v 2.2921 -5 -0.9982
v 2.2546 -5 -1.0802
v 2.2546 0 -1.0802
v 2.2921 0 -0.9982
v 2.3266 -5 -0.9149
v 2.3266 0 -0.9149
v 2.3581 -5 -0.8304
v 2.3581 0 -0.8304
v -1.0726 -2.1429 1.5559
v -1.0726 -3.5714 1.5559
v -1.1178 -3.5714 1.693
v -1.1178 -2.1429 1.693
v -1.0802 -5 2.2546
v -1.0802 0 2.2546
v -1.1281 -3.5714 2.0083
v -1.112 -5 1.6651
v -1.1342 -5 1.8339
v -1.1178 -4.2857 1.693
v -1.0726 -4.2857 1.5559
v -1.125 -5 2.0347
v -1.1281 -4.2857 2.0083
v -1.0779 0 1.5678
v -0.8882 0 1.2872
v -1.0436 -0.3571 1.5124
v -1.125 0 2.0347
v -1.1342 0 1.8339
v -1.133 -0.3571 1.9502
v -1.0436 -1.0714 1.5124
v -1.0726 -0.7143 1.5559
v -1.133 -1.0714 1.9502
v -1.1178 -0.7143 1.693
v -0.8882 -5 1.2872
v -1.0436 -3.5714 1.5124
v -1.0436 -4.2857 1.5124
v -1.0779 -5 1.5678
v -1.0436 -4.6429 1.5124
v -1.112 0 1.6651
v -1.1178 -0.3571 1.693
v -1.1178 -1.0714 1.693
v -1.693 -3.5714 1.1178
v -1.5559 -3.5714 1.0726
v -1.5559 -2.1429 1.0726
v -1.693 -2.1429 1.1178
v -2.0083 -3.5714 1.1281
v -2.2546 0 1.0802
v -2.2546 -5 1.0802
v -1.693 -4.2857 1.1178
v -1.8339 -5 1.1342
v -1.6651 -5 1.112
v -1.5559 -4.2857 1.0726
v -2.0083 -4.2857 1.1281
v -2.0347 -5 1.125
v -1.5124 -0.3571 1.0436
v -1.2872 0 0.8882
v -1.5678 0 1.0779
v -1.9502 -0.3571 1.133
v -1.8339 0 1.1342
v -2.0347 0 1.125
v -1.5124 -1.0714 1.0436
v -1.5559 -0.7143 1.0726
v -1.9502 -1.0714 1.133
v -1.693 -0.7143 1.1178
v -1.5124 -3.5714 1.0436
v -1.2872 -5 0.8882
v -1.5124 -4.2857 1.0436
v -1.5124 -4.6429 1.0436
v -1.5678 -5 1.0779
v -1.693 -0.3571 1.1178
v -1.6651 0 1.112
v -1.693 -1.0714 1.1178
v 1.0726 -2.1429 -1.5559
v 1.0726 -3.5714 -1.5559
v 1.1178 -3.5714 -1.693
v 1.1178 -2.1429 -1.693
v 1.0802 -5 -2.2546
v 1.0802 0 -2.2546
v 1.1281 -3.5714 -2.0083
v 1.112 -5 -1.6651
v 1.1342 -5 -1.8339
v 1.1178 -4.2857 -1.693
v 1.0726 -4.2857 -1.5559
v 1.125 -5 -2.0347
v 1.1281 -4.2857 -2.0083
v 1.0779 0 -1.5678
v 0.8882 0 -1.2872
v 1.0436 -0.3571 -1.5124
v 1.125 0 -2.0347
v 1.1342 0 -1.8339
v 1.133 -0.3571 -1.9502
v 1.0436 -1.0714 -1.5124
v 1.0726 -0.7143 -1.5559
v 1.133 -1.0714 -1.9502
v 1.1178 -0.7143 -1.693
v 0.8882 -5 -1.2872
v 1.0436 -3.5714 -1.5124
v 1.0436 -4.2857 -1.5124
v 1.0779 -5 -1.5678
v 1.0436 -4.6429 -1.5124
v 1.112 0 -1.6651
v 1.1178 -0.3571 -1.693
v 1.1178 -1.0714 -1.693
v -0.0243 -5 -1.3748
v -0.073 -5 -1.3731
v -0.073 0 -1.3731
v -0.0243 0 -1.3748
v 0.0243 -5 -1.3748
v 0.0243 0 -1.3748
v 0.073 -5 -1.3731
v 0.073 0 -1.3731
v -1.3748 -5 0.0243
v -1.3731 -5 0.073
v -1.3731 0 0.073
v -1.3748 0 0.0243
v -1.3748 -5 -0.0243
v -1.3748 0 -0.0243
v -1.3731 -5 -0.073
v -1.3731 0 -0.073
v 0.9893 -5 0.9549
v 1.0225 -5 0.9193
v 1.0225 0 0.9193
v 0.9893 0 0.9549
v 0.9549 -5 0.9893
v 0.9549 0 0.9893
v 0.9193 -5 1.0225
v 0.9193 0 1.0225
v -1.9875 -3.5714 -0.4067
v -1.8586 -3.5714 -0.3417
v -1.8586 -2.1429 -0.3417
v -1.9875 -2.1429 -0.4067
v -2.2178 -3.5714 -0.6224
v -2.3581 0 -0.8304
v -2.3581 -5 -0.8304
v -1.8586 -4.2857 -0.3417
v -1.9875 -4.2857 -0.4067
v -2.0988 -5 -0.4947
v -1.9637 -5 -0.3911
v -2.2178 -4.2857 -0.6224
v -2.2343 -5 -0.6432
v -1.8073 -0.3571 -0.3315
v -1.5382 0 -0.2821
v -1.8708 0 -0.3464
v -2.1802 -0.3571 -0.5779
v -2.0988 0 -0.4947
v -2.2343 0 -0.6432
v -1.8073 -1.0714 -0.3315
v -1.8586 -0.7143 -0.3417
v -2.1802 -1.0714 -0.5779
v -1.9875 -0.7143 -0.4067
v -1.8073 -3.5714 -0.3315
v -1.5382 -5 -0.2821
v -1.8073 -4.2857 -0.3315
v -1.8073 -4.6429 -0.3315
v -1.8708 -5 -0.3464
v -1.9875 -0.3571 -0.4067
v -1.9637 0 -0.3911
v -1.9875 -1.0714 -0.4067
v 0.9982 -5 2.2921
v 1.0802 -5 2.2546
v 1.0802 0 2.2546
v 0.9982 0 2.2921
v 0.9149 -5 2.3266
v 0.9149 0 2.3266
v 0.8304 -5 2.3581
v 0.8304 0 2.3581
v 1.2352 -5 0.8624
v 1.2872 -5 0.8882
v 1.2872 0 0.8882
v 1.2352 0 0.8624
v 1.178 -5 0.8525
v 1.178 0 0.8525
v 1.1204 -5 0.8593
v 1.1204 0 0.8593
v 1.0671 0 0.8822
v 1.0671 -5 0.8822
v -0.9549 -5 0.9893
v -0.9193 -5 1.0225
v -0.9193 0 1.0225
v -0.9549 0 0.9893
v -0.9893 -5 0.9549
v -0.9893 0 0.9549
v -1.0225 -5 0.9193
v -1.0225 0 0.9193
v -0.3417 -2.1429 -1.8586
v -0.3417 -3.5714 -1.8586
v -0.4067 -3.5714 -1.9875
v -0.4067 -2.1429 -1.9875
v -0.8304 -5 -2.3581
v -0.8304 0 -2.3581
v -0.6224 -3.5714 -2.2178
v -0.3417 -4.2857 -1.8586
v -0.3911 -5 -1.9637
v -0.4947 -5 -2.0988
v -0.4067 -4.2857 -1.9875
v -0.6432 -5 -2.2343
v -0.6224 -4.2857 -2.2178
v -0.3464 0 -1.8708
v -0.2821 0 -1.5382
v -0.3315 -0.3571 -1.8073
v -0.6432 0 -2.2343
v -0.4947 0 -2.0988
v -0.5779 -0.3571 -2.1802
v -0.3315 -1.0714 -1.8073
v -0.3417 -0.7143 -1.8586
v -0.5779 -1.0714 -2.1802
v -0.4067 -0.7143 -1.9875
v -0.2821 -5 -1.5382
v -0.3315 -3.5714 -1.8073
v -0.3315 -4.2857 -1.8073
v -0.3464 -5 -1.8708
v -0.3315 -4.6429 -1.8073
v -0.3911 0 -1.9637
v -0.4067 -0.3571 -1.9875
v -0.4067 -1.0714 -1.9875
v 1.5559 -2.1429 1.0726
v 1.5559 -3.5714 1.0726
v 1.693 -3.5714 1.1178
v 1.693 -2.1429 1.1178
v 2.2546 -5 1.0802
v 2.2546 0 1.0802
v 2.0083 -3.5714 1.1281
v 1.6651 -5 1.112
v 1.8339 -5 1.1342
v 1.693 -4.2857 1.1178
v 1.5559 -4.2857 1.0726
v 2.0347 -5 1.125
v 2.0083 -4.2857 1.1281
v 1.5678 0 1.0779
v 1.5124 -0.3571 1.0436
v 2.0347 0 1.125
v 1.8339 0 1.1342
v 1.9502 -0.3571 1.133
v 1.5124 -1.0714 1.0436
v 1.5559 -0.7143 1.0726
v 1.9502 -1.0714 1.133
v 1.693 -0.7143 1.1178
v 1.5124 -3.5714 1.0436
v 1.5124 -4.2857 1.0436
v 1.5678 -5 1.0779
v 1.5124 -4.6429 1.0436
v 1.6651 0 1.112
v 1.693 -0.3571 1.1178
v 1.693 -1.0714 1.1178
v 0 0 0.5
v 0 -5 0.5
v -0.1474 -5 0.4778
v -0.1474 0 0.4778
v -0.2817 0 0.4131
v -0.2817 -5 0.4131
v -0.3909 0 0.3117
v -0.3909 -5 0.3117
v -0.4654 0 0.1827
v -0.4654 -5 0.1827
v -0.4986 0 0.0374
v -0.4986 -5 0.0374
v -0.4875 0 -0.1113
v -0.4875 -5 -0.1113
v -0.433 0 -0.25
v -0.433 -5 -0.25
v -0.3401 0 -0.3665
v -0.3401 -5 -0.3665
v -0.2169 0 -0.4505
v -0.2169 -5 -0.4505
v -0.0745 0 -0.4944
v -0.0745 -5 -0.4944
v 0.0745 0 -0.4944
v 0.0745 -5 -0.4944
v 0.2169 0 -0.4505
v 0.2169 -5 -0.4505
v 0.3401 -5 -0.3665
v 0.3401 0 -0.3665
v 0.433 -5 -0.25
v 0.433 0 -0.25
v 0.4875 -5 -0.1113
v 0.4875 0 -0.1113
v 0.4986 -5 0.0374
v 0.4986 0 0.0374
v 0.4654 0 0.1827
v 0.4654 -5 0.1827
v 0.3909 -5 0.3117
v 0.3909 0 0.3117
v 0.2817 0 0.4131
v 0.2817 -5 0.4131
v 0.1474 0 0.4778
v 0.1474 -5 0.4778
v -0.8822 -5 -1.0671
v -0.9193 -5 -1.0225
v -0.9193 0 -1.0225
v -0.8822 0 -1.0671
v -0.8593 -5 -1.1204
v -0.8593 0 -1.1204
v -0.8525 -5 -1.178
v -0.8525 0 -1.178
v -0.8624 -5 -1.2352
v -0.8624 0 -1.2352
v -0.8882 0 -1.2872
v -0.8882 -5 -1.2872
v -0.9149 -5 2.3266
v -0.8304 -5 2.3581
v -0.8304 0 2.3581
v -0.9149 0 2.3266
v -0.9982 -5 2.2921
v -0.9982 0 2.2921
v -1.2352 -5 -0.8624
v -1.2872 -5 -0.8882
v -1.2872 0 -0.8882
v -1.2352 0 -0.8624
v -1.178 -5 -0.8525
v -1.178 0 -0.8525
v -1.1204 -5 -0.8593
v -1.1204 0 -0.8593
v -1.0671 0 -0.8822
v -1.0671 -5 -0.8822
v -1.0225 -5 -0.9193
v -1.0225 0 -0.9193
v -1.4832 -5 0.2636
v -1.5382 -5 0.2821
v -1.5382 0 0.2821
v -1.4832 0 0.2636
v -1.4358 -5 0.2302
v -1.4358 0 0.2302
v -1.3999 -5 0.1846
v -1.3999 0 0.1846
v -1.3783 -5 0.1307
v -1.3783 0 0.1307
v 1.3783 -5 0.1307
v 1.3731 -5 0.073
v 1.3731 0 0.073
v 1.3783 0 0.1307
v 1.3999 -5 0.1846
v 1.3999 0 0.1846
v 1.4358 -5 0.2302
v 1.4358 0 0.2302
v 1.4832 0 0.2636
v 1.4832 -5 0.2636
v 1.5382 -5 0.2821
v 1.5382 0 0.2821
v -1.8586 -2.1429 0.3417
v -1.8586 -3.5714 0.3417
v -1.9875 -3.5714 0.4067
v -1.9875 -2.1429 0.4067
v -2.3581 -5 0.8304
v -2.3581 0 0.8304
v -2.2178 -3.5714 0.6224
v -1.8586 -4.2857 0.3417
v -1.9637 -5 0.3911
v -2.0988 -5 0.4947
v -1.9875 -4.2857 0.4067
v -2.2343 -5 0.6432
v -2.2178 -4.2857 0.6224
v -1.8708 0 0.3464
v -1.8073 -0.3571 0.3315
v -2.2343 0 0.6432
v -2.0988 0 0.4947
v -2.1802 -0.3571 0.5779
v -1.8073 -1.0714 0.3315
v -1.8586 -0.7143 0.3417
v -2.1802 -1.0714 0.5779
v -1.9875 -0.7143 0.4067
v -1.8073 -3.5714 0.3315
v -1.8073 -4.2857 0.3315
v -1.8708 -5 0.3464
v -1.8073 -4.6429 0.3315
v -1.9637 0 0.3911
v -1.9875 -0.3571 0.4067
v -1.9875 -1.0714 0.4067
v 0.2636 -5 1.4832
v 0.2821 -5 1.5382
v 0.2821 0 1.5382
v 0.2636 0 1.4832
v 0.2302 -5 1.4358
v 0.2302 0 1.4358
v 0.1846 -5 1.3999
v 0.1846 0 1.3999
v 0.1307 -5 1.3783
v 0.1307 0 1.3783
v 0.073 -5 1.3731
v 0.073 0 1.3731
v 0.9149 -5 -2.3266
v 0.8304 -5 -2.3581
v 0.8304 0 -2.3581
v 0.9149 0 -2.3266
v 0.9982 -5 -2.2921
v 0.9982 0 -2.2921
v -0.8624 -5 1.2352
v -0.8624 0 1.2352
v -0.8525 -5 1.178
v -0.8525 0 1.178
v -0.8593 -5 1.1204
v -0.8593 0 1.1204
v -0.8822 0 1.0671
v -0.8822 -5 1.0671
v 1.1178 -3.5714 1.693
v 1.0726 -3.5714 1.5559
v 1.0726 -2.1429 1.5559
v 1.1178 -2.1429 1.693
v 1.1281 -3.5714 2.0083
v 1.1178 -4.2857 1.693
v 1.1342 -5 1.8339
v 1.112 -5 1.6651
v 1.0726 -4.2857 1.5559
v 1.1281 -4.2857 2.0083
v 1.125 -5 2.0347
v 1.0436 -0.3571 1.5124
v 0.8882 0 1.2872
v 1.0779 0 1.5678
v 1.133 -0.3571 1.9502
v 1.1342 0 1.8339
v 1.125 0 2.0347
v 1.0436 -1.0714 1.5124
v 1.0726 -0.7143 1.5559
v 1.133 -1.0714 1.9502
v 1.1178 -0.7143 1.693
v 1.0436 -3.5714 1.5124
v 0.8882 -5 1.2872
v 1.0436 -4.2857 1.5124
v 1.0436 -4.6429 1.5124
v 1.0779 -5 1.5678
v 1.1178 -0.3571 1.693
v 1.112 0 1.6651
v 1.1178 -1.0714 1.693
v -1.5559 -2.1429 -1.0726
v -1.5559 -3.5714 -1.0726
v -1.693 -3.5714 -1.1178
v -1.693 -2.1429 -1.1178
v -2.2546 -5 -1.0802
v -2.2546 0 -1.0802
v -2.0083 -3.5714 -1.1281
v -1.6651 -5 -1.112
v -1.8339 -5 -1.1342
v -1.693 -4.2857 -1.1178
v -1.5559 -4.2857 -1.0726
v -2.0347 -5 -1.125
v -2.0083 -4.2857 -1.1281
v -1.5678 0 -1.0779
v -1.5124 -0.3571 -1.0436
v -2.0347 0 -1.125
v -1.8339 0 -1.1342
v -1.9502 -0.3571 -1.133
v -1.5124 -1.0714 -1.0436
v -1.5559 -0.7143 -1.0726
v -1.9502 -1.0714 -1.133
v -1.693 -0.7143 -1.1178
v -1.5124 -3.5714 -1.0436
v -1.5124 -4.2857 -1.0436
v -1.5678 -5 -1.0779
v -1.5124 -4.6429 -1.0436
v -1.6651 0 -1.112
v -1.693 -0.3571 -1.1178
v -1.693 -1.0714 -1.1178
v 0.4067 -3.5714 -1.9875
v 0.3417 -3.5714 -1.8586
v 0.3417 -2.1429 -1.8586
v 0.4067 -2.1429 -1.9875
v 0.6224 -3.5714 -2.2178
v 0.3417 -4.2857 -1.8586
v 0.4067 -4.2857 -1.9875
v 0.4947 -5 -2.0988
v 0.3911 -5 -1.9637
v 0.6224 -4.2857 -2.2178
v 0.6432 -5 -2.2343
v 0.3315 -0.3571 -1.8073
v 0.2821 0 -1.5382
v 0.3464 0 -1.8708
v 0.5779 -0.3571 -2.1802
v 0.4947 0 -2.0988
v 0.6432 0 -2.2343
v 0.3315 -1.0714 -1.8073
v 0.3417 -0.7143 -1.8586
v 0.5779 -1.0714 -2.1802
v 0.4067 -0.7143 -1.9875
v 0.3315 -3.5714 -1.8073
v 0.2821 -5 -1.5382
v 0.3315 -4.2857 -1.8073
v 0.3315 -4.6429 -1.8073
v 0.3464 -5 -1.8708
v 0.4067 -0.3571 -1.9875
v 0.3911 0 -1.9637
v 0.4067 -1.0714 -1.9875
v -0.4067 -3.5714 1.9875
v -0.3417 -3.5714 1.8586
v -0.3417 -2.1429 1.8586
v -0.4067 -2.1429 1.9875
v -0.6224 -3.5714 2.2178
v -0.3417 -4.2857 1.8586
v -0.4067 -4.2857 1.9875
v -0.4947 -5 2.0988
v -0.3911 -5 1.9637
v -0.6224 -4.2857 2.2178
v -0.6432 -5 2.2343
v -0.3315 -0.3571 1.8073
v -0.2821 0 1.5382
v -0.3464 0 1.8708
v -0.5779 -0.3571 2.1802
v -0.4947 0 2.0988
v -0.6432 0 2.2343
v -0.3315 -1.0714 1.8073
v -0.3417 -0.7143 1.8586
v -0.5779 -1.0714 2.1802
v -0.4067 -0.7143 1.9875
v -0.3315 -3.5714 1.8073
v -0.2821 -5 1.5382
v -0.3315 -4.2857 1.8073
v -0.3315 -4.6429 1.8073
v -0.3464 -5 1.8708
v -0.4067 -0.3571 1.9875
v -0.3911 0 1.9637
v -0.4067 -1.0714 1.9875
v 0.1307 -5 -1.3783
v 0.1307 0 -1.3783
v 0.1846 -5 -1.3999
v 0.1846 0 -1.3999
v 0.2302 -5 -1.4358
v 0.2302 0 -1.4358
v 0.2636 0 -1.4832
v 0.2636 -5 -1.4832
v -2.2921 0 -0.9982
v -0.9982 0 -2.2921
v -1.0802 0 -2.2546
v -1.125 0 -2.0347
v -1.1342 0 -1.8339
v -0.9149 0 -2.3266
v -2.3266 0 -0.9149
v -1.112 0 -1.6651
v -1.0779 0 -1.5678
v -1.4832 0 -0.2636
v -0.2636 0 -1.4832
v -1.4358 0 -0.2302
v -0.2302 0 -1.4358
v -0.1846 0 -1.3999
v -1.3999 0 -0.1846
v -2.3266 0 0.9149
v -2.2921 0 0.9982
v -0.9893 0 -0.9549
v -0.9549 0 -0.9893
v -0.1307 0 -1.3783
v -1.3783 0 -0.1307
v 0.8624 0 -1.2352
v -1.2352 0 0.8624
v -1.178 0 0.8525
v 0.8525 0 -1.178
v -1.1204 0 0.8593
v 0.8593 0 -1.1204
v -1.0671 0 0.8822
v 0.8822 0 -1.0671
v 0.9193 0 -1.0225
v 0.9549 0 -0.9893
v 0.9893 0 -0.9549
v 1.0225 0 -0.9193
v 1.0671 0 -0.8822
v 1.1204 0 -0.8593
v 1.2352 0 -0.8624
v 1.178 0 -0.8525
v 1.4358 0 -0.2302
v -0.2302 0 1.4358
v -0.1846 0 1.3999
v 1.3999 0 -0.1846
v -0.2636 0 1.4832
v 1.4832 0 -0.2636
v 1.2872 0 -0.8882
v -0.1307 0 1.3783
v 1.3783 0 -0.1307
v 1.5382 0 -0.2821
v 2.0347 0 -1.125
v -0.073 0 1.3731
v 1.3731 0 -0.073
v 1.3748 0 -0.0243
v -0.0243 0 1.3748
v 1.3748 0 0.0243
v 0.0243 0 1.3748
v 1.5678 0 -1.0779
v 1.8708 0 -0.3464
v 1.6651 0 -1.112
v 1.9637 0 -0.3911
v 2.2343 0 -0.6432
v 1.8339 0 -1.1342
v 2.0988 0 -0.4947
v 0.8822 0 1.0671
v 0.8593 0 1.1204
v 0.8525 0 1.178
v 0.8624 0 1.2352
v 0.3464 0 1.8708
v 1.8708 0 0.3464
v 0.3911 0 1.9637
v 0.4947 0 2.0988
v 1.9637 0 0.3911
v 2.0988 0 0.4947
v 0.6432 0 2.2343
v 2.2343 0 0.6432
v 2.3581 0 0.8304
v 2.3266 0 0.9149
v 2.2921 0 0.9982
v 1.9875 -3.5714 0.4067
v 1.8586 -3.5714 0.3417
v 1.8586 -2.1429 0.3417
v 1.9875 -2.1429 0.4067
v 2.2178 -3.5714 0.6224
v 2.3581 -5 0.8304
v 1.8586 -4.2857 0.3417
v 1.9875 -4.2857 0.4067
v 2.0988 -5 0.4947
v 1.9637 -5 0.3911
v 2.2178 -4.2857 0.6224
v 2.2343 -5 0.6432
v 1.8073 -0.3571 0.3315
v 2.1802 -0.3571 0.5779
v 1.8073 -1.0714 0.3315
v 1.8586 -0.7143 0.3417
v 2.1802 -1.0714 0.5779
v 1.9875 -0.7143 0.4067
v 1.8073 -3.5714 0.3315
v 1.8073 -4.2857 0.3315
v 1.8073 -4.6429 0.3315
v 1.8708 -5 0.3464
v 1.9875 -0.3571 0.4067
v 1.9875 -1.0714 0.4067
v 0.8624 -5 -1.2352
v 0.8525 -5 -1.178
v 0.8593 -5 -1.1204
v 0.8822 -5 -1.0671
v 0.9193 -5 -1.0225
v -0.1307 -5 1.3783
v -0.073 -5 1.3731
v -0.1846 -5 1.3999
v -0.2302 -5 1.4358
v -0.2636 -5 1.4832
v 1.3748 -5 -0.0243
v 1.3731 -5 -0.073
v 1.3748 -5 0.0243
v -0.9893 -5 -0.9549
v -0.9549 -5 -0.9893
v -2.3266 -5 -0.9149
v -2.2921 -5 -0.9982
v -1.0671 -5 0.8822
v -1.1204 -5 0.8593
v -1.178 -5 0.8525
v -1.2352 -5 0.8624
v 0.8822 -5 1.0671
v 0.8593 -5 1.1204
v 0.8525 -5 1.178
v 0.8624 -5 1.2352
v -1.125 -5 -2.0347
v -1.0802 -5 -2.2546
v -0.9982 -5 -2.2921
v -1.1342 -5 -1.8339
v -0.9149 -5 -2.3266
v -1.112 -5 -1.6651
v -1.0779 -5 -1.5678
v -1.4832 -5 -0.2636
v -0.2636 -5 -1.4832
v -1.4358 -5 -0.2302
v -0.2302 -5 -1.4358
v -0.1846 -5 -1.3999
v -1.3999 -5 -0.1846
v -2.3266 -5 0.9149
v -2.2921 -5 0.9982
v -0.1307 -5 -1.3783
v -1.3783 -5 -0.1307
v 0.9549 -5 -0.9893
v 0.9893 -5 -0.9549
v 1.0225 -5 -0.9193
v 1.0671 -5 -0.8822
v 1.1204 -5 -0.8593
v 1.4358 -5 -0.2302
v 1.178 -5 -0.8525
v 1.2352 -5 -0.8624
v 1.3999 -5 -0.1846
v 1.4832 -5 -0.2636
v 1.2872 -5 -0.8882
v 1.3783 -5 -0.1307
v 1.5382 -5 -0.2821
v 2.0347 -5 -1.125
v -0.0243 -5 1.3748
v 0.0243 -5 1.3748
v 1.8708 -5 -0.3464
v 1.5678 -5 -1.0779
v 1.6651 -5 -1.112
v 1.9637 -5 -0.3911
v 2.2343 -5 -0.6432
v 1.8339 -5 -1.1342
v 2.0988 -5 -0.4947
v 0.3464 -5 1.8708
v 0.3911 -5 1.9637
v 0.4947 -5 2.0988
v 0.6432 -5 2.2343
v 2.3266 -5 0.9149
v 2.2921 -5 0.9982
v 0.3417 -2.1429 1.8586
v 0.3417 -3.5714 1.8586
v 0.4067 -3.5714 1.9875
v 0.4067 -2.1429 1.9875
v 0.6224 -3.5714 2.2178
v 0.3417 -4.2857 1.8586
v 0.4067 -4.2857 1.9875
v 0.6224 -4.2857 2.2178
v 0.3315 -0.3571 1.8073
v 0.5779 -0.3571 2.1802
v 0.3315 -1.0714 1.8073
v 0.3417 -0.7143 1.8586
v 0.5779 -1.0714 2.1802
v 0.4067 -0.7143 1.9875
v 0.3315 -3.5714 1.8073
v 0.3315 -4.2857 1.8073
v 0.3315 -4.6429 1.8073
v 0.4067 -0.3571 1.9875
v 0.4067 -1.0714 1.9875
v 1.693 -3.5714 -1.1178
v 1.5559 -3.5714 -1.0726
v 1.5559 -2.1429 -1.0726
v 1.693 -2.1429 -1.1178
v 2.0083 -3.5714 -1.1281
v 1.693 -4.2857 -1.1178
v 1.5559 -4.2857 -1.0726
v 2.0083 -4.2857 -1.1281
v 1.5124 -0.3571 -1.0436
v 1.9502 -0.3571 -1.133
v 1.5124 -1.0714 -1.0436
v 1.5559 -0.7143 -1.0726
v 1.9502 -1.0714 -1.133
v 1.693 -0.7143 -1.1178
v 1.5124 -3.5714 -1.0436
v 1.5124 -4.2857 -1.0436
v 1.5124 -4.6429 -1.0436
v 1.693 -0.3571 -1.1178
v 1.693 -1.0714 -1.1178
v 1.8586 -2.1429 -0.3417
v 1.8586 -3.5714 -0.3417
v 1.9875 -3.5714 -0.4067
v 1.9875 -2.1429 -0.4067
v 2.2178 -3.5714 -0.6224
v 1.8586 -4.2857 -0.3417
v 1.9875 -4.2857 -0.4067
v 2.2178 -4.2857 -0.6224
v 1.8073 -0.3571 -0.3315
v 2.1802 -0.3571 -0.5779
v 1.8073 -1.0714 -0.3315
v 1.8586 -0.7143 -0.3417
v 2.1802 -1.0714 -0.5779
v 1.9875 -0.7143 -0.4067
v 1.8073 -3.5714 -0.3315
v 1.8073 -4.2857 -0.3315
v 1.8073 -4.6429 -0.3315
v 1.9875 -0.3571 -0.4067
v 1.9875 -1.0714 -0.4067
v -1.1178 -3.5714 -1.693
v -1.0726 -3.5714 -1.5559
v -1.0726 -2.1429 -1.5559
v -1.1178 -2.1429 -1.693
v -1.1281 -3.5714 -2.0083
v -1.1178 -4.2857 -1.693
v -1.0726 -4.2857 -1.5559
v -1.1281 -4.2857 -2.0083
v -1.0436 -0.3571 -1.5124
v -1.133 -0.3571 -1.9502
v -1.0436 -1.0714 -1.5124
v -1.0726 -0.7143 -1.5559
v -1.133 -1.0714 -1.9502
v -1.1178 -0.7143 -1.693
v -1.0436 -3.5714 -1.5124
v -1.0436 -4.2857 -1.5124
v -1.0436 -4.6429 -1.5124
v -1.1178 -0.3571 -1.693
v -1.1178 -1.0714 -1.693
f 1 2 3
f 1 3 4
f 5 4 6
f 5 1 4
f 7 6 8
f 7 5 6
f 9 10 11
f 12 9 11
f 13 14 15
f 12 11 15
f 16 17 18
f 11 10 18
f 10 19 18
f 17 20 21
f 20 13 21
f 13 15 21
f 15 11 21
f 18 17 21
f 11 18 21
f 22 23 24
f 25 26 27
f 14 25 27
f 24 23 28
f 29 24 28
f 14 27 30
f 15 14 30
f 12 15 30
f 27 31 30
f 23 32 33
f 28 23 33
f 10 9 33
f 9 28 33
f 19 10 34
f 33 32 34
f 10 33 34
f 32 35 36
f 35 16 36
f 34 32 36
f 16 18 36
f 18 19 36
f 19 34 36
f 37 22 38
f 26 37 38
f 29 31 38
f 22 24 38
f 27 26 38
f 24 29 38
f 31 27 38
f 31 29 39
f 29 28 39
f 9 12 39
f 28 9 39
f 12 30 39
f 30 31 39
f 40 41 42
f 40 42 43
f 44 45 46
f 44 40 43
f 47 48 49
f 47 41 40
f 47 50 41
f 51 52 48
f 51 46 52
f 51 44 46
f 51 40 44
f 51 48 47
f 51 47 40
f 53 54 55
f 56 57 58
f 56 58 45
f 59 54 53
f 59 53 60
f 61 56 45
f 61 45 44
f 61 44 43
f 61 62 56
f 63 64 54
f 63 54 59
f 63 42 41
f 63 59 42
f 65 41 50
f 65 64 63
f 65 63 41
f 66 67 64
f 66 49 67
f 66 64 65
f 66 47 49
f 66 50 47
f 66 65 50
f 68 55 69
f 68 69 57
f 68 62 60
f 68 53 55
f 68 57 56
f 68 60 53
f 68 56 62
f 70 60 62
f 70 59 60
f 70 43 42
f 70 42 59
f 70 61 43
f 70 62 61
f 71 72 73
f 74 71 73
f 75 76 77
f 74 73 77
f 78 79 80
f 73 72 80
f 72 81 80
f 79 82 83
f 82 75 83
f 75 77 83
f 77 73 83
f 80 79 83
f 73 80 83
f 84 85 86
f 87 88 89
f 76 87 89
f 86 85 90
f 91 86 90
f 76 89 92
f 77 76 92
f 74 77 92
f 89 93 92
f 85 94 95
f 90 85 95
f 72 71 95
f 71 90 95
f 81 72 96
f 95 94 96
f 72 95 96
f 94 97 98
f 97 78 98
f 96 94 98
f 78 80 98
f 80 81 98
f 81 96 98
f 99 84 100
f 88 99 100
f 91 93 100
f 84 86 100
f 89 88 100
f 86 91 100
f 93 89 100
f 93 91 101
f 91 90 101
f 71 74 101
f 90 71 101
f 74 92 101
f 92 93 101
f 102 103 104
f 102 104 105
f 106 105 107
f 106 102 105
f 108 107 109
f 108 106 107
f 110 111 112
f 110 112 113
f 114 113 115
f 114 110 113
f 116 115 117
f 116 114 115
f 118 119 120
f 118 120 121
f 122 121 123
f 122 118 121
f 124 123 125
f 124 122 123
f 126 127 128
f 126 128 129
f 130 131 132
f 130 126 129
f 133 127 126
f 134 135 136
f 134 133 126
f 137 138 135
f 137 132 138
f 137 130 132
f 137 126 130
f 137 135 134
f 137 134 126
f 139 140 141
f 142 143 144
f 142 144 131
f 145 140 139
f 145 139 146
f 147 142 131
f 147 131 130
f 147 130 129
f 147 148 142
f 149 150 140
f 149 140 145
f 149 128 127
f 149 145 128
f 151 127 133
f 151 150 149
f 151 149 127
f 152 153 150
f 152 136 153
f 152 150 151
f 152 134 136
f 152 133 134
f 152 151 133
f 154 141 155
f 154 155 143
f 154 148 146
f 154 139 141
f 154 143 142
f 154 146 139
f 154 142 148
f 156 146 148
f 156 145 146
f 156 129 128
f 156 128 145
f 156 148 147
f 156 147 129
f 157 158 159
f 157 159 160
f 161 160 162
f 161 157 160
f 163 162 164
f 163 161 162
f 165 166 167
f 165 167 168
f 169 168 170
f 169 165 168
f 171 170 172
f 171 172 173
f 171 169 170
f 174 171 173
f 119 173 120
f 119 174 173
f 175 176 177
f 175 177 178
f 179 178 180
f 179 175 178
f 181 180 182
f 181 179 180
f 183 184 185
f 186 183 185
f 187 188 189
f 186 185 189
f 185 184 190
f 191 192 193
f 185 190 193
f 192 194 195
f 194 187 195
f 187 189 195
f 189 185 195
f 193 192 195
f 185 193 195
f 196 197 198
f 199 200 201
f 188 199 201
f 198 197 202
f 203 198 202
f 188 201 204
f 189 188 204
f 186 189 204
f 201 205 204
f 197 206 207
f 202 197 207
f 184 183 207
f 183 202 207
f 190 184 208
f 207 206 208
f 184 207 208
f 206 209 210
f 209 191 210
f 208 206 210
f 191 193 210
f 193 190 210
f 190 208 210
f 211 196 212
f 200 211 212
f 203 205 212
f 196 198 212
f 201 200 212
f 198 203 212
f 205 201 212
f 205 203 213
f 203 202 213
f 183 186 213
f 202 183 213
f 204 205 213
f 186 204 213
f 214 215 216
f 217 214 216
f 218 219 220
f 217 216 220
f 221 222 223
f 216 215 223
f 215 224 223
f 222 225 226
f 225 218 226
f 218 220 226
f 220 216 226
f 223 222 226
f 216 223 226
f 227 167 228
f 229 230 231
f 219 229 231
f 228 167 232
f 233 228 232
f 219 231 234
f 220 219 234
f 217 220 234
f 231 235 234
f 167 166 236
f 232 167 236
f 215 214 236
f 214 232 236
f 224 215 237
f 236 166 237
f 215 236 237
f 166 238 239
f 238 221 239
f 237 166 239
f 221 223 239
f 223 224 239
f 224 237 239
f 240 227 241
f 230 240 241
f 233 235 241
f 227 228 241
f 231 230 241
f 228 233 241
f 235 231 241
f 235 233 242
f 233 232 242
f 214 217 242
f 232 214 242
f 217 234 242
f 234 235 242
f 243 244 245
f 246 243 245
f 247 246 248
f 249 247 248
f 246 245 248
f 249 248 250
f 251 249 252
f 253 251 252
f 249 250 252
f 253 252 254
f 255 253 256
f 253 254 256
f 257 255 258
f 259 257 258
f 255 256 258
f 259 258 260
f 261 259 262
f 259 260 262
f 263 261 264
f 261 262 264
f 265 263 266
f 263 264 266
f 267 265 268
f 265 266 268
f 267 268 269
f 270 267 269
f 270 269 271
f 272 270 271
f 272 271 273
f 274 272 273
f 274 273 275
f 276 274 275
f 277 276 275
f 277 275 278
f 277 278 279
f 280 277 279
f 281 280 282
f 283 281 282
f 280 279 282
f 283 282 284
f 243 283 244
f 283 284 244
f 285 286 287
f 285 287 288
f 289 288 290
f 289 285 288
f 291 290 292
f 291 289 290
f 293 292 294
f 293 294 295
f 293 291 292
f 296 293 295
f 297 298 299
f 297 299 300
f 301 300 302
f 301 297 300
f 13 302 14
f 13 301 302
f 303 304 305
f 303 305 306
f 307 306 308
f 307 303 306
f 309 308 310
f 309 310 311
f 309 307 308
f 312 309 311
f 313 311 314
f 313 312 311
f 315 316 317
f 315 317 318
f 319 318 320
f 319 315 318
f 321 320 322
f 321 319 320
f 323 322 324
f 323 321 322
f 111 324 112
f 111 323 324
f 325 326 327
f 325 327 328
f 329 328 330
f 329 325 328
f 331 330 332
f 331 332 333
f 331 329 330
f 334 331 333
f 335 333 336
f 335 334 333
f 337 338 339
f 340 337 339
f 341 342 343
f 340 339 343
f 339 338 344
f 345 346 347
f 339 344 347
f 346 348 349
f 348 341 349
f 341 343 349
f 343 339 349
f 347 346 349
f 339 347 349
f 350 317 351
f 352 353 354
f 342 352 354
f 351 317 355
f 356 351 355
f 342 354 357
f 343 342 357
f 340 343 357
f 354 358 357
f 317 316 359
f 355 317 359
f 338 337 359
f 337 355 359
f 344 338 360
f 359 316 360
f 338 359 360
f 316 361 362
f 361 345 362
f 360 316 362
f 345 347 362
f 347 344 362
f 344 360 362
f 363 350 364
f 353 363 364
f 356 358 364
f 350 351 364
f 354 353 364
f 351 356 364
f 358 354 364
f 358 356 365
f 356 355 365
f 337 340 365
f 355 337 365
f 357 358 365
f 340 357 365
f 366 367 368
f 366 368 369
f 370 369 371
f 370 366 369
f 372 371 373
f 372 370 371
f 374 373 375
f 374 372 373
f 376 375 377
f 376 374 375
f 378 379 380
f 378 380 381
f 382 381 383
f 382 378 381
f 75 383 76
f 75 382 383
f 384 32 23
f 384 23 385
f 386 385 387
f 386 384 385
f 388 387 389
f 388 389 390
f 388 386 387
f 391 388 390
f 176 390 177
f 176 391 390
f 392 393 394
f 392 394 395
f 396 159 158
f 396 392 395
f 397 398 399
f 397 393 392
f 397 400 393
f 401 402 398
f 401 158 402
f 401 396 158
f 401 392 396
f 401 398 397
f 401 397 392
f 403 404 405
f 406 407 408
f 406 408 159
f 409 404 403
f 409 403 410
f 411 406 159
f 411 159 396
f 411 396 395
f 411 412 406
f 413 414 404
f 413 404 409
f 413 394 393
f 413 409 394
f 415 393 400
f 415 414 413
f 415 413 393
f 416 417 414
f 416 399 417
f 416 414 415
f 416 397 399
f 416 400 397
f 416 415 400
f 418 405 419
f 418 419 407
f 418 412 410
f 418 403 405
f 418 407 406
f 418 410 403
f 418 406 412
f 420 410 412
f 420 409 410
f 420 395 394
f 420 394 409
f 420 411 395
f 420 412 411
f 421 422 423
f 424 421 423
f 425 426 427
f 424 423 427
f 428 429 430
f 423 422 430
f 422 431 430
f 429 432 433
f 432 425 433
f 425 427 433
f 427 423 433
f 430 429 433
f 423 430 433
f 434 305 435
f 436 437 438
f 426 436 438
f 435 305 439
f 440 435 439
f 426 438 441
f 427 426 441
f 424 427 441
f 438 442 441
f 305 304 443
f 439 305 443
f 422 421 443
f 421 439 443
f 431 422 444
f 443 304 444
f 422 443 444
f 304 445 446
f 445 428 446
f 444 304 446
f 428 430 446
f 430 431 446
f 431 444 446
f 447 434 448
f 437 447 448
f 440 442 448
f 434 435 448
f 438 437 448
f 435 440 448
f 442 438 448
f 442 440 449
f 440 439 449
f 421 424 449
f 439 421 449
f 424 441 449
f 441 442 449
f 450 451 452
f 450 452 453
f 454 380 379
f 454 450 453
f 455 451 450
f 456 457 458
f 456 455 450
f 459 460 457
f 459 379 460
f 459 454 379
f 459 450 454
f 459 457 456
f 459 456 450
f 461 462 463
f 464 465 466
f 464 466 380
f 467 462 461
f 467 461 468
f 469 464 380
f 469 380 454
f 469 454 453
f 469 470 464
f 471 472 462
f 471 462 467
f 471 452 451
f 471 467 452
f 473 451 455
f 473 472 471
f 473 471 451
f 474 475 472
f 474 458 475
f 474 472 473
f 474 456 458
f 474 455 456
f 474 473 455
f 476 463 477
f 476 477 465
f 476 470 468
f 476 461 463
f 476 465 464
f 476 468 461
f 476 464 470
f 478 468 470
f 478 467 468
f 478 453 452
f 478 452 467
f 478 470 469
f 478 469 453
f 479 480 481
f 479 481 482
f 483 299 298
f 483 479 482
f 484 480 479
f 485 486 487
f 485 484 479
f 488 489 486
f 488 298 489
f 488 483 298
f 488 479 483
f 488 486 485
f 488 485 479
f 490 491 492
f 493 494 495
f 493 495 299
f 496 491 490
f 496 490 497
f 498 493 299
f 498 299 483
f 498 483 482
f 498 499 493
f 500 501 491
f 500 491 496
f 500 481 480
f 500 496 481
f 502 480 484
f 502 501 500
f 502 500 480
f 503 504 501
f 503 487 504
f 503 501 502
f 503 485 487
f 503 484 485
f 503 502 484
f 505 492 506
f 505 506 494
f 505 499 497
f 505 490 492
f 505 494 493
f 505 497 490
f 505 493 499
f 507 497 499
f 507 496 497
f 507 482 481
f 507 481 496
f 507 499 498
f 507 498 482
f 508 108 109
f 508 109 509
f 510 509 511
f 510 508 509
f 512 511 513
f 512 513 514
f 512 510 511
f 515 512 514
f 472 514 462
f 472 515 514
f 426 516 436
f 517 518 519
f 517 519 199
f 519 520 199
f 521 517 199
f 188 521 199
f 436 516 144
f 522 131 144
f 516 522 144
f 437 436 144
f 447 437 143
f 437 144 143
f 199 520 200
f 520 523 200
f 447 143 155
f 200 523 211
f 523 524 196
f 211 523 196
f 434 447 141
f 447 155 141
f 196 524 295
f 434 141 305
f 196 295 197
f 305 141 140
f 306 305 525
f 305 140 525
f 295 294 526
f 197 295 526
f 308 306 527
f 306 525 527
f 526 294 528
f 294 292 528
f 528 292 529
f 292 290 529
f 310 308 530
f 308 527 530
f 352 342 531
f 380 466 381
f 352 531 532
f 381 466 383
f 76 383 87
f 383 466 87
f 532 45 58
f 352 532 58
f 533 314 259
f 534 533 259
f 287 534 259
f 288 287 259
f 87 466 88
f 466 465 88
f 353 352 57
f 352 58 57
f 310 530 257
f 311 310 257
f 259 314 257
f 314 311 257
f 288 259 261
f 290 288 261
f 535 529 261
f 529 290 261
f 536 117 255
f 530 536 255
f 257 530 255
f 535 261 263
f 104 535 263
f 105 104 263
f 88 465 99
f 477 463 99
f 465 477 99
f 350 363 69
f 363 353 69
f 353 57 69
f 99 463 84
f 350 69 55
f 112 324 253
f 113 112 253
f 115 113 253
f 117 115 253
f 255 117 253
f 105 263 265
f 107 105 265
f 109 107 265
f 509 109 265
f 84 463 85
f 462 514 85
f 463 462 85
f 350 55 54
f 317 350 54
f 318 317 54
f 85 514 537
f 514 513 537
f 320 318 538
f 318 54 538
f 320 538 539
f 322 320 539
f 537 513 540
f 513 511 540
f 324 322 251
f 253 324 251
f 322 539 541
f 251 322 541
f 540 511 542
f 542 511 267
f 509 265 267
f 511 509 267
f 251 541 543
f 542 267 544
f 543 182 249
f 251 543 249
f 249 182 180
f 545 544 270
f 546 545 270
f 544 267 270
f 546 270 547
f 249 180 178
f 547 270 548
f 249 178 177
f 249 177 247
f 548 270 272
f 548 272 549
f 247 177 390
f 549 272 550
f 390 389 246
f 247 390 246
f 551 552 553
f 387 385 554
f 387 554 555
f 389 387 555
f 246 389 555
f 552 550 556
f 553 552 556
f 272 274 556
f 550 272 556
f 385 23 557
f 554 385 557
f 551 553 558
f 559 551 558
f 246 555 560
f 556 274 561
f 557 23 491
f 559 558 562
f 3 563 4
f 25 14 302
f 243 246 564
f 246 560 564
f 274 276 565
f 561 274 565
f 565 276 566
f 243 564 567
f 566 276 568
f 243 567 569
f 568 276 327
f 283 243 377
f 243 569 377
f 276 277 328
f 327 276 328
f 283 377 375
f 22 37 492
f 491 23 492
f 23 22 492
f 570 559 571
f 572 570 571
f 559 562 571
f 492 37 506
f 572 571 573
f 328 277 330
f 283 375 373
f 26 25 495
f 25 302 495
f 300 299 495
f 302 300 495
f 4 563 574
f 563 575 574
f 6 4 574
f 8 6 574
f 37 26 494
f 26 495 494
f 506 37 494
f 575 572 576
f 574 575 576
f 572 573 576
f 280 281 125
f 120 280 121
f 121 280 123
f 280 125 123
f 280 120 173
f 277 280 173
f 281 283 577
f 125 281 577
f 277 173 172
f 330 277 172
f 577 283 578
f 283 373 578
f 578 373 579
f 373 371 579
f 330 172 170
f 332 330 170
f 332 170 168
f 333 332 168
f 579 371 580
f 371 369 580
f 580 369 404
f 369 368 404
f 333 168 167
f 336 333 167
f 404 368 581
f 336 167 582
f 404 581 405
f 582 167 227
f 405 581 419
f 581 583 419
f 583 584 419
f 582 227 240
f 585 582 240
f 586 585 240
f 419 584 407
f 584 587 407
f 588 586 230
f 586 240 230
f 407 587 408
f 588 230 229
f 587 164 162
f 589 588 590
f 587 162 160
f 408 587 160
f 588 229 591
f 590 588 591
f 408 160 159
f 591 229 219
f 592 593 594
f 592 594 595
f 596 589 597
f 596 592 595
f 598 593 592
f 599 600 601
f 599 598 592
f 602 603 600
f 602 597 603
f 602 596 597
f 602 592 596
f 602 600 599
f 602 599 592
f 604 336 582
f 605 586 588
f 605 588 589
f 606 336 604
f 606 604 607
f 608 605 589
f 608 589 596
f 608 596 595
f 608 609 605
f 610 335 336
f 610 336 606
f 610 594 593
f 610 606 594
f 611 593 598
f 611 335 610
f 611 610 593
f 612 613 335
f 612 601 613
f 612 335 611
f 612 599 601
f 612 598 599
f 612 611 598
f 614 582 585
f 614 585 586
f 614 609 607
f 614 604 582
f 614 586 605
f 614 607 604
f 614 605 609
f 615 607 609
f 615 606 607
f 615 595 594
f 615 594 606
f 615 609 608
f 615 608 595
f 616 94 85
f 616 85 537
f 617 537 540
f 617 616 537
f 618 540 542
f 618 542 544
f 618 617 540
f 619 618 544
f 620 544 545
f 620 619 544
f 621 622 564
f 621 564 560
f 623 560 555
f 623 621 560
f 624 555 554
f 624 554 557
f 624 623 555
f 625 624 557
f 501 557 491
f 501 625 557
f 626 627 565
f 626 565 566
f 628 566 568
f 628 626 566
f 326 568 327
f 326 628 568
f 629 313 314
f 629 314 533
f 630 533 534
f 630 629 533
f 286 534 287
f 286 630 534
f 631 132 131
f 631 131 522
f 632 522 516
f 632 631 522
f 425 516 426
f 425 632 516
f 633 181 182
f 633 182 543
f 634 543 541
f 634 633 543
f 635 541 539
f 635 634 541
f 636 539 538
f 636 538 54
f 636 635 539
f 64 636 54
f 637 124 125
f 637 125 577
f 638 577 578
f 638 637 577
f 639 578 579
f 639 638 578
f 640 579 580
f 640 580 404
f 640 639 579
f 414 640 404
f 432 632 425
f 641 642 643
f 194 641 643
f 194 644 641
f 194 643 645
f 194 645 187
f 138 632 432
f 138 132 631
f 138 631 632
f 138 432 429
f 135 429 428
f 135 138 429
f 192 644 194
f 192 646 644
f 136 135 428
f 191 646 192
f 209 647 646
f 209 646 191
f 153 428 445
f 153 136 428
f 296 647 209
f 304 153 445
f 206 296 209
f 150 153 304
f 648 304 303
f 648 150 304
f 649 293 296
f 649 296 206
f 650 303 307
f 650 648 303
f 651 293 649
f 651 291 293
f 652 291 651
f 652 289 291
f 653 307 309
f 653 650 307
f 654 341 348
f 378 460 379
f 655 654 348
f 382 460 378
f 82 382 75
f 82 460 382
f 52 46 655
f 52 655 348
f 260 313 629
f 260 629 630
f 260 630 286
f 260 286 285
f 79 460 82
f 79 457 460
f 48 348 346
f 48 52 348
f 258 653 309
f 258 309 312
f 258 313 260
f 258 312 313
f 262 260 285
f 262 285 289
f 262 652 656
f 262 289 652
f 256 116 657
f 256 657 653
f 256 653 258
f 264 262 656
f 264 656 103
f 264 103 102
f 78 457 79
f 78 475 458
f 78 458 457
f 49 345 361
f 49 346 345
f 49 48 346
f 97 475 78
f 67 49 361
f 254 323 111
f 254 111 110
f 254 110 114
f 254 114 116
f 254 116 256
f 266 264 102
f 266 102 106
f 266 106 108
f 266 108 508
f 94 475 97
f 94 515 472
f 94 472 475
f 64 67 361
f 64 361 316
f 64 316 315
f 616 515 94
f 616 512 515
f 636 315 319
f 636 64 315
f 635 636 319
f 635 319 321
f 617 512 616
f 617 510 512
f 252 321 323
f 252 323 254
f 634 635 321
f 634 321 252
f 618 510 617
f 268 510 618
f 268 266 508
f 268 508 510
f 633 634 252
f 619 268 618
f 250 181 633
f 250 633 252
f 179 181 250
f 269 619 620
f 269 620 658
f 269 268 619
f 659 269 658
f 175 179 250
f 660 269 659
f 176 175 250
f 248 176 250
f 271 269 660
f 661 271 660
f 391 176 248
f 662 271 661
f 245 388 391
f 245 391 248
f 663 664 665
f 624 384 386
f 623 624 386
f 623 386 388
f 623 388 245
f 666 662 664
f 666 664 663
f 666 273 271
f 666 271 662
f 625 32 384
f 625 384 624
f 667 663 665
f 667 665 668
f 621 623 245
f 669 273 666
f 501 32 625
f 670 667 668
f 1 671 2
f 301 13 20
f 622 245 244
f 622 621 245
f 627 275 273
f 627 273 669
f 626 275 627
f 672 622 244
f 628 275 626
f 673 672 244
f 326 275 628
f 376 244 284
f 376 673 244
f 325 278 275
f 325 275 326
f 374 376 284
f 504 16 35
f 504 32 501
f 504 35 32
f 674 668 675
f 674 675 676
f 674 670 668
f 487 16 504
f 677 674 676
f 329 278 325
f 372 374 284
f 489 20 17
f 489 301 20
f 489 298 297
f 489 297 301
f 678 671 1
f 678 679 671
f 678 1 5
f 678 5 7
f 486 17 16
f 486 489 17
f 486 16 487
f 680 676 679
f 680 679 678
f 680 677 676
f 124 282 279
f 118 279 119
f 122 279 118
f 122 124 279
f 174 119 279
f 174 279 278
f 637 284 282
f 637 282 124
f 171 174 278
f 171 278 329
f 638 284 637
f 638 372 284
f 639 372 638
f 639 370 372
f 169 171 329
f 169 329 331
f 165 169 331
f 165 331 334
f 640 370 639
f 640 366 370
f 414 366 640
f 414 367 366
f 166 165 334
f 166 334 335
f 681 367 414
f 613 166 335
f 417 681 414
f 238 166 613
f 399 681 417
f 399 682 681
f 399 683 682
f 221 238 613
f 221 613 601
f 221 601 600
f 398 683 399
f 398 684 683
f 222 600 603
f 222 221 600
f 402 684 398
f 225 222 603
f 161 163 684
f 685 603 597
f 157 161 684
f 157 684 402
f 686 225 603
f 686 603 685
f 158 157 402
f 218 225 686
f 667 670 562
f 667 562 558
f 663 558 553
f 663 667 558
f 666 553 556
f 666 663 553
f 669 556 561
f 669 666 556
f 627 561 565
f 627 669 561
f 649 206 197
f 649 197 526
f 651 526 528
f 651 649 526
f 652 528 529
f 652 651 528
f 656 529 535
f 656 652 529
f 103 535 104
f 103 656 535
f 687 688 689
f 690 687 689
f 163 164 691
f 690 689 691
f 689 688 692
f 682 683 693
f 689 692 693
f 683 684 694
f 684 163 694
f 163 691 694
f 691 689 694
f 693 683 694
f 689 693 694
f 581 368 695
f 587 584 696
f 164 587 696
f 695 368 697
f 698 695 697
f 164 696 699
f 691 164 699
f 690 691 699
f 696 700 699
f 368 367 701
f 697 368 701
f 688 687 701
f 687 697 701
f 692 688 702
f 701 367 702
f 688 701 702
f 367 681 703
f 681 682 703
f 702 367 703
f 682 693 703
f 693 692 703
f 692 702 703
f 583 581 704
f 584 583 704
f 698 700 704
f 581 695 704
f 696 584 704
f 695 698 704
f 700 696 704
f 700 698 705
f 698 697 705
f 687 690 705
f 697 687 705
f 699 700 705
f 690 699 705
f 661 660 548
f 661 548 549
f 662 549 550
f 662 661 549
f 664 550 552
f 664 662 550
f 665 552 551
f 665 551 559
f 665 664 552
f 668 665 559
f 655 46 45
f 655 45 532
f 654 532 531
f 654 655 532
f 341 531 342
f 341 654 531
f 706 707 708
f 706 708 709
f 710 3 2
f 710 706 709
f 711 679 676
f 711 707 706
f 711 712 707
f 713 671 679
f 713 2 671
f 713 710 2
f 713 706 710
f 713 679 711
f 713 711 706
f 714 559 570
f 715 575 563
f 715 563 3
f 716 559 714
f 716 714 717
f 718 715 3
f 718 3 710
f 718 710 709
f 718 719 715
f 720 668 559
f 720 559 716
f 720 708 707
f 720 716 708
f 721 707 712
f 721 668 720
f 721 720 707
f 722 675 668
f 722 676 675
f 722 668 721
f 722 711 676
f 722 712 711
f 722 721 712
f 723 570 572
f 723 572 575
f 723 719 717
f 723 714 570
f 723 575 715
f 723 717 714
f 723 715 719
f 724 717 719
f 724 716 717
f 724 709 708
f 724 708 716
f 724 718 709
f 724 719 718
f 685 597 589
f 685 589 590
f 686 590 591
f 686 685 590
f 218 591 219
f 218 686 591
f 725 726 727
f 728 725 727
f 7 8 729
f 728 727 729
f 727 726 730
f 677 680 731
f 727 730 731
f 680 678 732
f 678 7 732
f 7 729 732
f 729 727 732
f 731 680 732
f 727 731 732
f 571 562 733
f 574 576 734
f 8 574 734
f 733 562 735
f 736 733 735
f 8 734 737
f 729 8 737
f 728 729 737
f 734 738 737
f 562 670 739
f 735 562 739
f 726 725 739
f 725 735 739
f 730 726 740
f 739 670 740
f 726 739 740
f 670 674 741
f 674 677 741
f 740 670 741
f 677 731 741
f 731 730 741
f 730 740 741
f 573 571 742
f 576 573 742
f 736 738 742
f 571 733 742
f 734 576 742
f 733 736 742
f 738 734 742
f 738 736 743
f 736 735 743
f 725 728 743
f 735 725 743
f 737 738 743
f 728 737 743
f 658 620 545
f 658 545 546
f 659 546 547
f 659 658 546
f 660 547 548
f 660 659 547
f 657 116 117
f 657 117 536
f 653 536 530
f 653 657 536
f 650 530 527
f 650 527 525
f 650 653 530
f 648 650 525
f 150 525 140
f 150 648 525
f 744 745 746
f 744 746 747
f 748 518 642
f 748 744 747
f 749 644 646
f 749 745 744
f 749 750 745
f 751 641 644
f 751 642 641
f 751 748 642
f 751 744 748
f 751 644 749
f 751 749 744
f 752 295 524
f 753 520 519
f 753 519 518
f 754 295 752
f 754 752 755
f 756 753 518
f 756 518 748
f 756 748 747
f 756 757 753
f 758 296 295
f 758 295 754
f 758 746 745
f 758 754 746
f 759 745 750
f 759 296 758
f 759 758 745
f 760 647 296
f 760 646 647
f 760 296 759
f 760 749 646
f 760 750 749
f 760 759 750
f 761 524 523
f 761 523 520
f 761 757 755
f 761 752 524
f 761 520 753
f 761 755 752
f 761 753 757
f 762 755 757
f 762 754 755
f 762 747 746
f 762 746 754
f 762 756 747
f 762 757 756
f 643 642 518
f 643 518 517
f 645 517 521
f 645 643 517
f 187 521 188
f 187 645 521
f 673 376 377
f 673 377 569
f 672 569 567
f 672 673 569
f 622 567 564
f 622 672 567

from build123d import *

# Parameters (mm, degrees)
ESBO_O1_R                = 0.5
RESSALTO_EXTRUS_O1_DEPTH = 5


with BuildPart() as part:
    # Esboço1 → Ressalto-extrusão1 (new body)
    with BuildSketch(Plane.XZ.offset(5)):
        with BuildLine():
            ThreePointArc((0.88816946, -1.287165167), (0.853822869, -1.148958648), (0.919306865, -1.022496889))
            ThreePointArc((0.919306865, -1.022496889), (0.972271824, -0.972271824), (1.022496889, -0.919306865))
            ThreePointArc((1.022496889, -0.919306865), (1.148958648, -0.853822869), (1.287165167, -0.88816946))
            add(Edge.make_bspline(
                [(1.287165167, -0.88816946), (1.383791359, -0.954882813), (1.556408334, -1.073982269), (1.549215881, -1.068804746), (1.613247697, -1.099886307), (1.689593731, -1.118505632), (1.818337157, -1.137704346), (2.003981613, -1.135749512), (2.169907523, -1.103671613), (2.254570833, -1.080236252)],
                knots=[0.030903034, 0.030903034, 0.030903034, 0.030903034, 0.091208758, 0.151514483, 0.272125931, 0.39273738, 0.513348828, 0.754571725, 0.995794622, 0.995794622, 0.995794622, 0.995794622], degree=3))
            ThreePointArc((2.254570833, -1.080236252), (2.309698831, -0.956708581), (2.358064704, -0.830379945))
            add(Edge.make_bspline(
                [(1.538193866, -0.28213257), (1.653692366, -0.303284141), (1.859967032, -0.341126742), (1.851220139, -0.339701972), (1.918475453, -0.36300132), (1.985626101, -0.403820267), (2.090236992, -0.481280077), (2.220125169, -0.613932807), (2.314770006, -0.753942643), (2.358064704, -0.830379945)],
                knots=[0.030903034, 0.030903034, 0.030903034, 0.030903034, 0.091208758, 0.151514483, 0.272125931, 0.39273738, 0.513348828, 0.754571725, 0.995794622, 0.995794622, 0.995794622, 0.995794622], degree=3))
            ThreePointArc((1.538193866, -0.28213257), (1.416180392, -0.208692511), (1.373062602, -0.072966366))
            ThreePointArc((1.373062602, -0.072966366), (1.375, 0), (1.373062602, 0.072966366))
            ThreePointArc((1.373062602, 0.072966366), (1.416180392, 0.208692511), (1.538193866, 0.28213257))
            add(Edge.make_bspline(
                [(1.538193866, 0.28213257), (1.653692366, 0.303284141), (1.859967032, 0.341126742), (1.851220139, 0.339701972), (1.918475453, 0.36300132), (1.985626101, 0.403820267), (2.090236992, 0.481280077), (2.220125169, 0.613932807), (2.314770006, 0.753942643), (2.358064704, 0.830379945)],
                knots=[0.030903034, 0.030903034, 0.030903034, 0.030903034, 0.091208758, 0.151514483, 0.272125931, 0.39273738, 0.513348828, 0.754571725, 0.995794622, 0.995794622, 0.995794622, 0.995794622], degree=3))
            ThreePointArc((2.358064704, 0.830379945), (2.309698831, 0.956708581), (2.254570833, 1.080236252))
            add(Edge.make_bspline(
                [(1.287165167, 0.88816946), (1.383791359, 0.954882813), (1.556408334, 1.073982269), (1.549215881, 1.068804746), (1.613247697, 1.099886307), (1.689593731, 1.118505632), (1.818337157, 1.137704346), (2.003981613, 1.135749512), (2.169907523, 1.103671613), (2.254570833, 1.080236252)],
                knots=[0.030903034, 0.030903034, 0.030903034, 0.030903034, 0.091208758, 0.151514483, 0.272125931, 0.39273738, 0.513348828, 0.754571725, 0.995794622, 0.995794622, 0.995794622, 0.995794622], degree=3))
            ThreePointArc((1.287165167, 0.88816946), (1.148958648, 0.853822869), (1.022496889, 0.919306865))
            ThreePointArc((1.022496889, 0.919306865), (0.972271824, 0.972271824), (0.919306865, 1.022496889))
            ThreePointArc((0.919306865, 1.022496889), (0.853822869, 1.148958648), (0.88816946, 1.287165167))
            add(Edge.make_bspline(
                [(0.88816946, 1.287165167), (0.954882813, 1.383791359), (1.073982269, 1.556408334), (1.068804746, 1.549215881), (1.099886307, 1.613247697), (1.118505632, 1.689593731), (1.137704346, 1.818337157), (1.135749512, 2.003981613), (1.103671613, 2.169907523), (1.080236252, 2.254570833)],
                knots=[0.030903034, 0.030903034, 0.030903034, 0.030903034, 0.091208758, 0.151514483, 0.272125931, 0.39273738, 0.513348828, 0.754571725, 0.995794622, 0.995794622, 0.995794622, 0.995794622], degree=3))
            ThreePointArc((1.080236252, 2.254570833), (0.956708581, 2.309698831), (0.830379945, 2.358064704))
            add(Edge.make_bspline(
                [(0.28213257, 1.538193866), (0.303284141, 1.653692366), (0.341126742, 1.859967032), (0.339701972, 1.851220139), (0.36300132, 1.918475453), (0.403820267, 1.985626101), (0.481280077, 2.090236992), (0.613932807, 2.220125169), (0.753942643, 2.314770006), (0.830379945, 2.358064704)],
                knots=[0.030903034, 0.030903034, 0.030903034, 0.030903034, 0.091208758, 0.151514483, 0.272125931, 0.39273738, 0.513348828, 0.754571725, 0.995794622, 0.995794622, 0.995794622, 0.995794622], degree=3))
            ThreePointArc((0.28213257, 1.538193866), (0.208692511, 1.416180392), (0.072966366, 1.373062602))
            ThreePointArc((0.072966366, 1.373062602), (0, 1.375), (-0.072966366, 1.373062602))
            ThreePointArc((-0.072966366, 1.373062602), (-0.208692511, 1.416180392), (-0.28213257, 1.538193866))
            add(Edge.make_bspline(
                [(-0.28213257, 1.538193866), (-0.303284141, 1.653692366), (-0.341126742, 1.859967032), (-0.339701972, 1.851220139), (-0.36300132, 1.918475453), (-0.403820267, 1.985626101), (-0.481280077, 2.090236992), (-0.613932807, 2.220125169), (-0.753942643, 2.314770006), (-0.830379945, 2.358064704)],
                knots=[0.030903034, 0.030903034, 0.030903034, 0.030903034, 0.091208758, 0.151514483, 0.272125931, 0.39273738, 0.513348828, 0.754571725, 0.995794622, 0.995794622, 0.995794622, 0.995794622], degree=3))
            ThreePointArc((-0.830379945, 2.358064704), (-0.956708581, 2.309698831), (-1.080236252, 2.254570833))
            add(Edge.make_bspline(
                [(-0.88816946, 1.287165167), (-0.954882813, 1.383791359), (-1.073982269, 1.556408334), (-1.068804746, 1.549215881), (-1.099886307, 1.613247697), (-1.118505632, 1.689593731), (-1.137704346, 1.818337157), (-1.135749512, 2.003981613), (-1.103671613, 2.169907523), (-1.080236252, 2.254570833)],
                knots=[0.030903034, 0.030903034, 0.030903034, 0.030903034, 0.091208758, 0.151514483, 0.272125931, 0.39273738, 0.513348828, 0.754571725, 0.995794622, 0.995794622, 0.995794622, 0.995794622], degree=3))
            ThreePointArc((-0.88816946, 1.287165167), (-0.853822869, 1.148958648), (-0.919306865, 1.022496889))
            ThreePointArc((-0.919306865, 1.022496889), (-0.972271824, 0.972271824), (-1.022496889, 0.919306865))
            ThreePointArc((-1.022496889, 0.919306865), (-1.148958648, 0.853822869), (-1.287165167, 0.88816946))
            add(Edge.make_bspline(
                [(-1.287165167, 0.88816946), (-1.383791359, 0.954882813), (-1.556408334, 1.073982269), (-1.549215881, 1.068804746), (-1.613247697, 1.099886307), (-1.689593731, 1.118505632), (-1.818337157, 1.137704346), (-2.003981613, 1.135749512), (-2.169907523, 1.103671613), (-2.254570833, 1.080236252)],
                knots=[0.030903034, 0.030903034, 0.030903034, 0.030903034, 0.091208758, 0.151514483, 0.272125931, 0.39273738, 0.513348828, 0.754571725, 0.995794622, 0.995794622, 0.995794622, 0.995794622], degree=3))
            ThreePointArc((-2.254570833, 1.080236252), (-2.309698831, 0.956708581), (-2.358064704, 0.830379945))
            add(Edge.make_bspline(
                [(-1.538193866, 0.28213257), (-1.653692366, 0.303284141), (-1.859967032, 0.341126742), (-1.851220139, 0.339701972), (-1.918475453, 0.36300132), (-1.985626101, 0.403820267), (-2.090236992, 0.481280077), (-2.220125169, 0.613932807), (-2.314770006, 0.753942643), (-2.358064704, 0.830379945)],
                knots=[0.030903034, 0.030903034, 0.030903034, 0.030903034, 0.091208758, 0.151514483, 0.272125931, 0.39273738, 0.513348828, 0.754571725, 0.995794622, 0.995794622, 0.995794622, 0.995794622], degree=3))
            ThreePointArc((-1.538193866, 0.28213257), (-1.416180392, 0.208692511), (-1.373062602, 0.072966366))
            ThreePointArc((-1.373062602, 0.072966366), (-1.375, 0), (-1.373062602, -0.072966366))
            ThreePointArc((-1.373062602, -0.072966366), (-1.416180392, -0.208692511), (-1.538193866, -0.28213257))
            add(Edge.make_bspline(
                [(-1.538193866, -0.28213257), (-1.653692366, -0.303284141), (-1.859967032, -0.341126742), (-1.851220139, -0.339701972), (-1.918475453, -0.36300132), (-1.985626101, -0.403820267), (-2.090236992, -0.481280077), (-2.220125169, -0.613932807), (-2.314770006, -0.753942643), (-2.358064704, -0.830379945)],
                knots=[0.030903034, 0.030903034, 0.030903034, 0.030903034, 0.091208758, 0.151514483, 0.272125931, 0.39273738, 0.513348828, 0.754571725, 0.995794622, 0.995794622, 0.995794622, 0.995794622], degree=3))
            ThreePointArc((-2.358064704, -0.830379945), (-2.309698831, -0.956708581), (-2.254570833, -1.080236252))
            add(Edge.make_bspline(
                [(-1.287165167, -0.88816946), (-1.383791359, -0.954882813), (-1.556408334, -1.073982269), (-1.549215881, -1.068804746), (-1.613247697, -1.099886307), (-1.689593731, -1.118505632), (-1.818337157, -1.137704346), (-2.003981613, -1.135749512), (-2.169907523, -1.103671613), (-2.254570833, -1.080236252)],
                knots=[0.030903034, 0.030903034, 0.030903034, 0.030903034, 0.091208758, 0.151514483, 0.272125931, 0.39273738, 0.513348828, 0.754571725, 0.995794622, 0.995794622, 0.995794622, 0.995794622], degree=3))
            ThreePointArc((-1.287165167, -0.88816946), (-1.148958648, -0.853822869), (-1.022496889, -0.919306865))
            ThreePointArc((-1.022496889, -0.919306865), (-0.972271824, -0.972271824), (-0.919306865, -1.022496889))
            ThreePointArc((-0.919306865, -1.022496889), (-0.853822869, -1.148958648), (-0.88816946, -1.287165167))
            add(Edge.make_bspline(
                [(-0.88816946, -1.287165167), (-0.954882813, -1.383791359), (-1.073982269, -1.556408334), (-1.068804746, -1.549215881), (-1.099886307, -1.613247697), (-1.118505632, -1.689593731), (-1.137704346, -1.818337157), (-1.135749512, -2.003981613), (-1.103671613, -2.169907523), (-1.080236252, -2.254570833)],
                knots=[0.030903034, 0.030903034, 0.030903034, 0.030903034, 0.091208758, 0.151514483, 0.272125931, 0.39273738, 0.513348828, 0.754571725, 0.995794622, 0.995794622, 0.995794622, 0.995794622], degree=3))
            ThreePointArc((-1.080236252, -2.254570833), (-0.956708581, -2.309698831), (-0.830379945, -2.358064704))
            add(Edge.make_bspline(
                [(-0.28213257, -1.538193866), (-0.303284141, -1.653692366), (-0.341126742, -1.859967032), (-0.339701972, -1.851220139), (-0.36300132, -1.918475453), (-0.403820267, -1.985626101), (-0.481280077, -2.090236992), (-0.613932807, -2.220125169), (-0.753942643, -2.314770006), (-0.830379945, -2.358064704)],
                knots=[0.030903034, 0.030903034, 0.030903034, 0.030903034, 0.091208758, 0.151514483, 0.272125931, 0.39273738, 0.513348828, 0.754571725, 0.995794622, 0.995794622, 0.995794622, 0.995794622], degree=3))
            ThreePointArc((-0.28213257, -1.538193866), (-0.208692511, -1.416180392), (-0.072966366, -1.373062602))
            ThreePointArc((-0.072966366, -1.373062602), (0, -1.375), (0.072966366, -1.373062602))
            ThreePointArc((0.072966366, -1.373062602), (0.208692511, -1.416180392), (0.28213257, -1.538193866))
            add(Edge.make_bspline(
                [(0.28213257, -1.538193866), (0.303284141, -1.653692366), (0.341126742, -1.859967032), (0.339701972, -1.851220139), (0.36300132, -1.918475453), (0.403820267, -1.985626101), (0.481280077, -2.090236992), (0.613932807, -2.220125169), (0.753942643, -2.314770006), (0.830379945, -2.358064704)],
                knots=[0.030903034, 0.030903034, 0.030903034, 0.030903034, 0.091208758, 0.151514483, 0.272125931, 0.39273738, 0.513348828, 0.754571725, 0.995794622, 0.995794622, 0.995794622, 0.995794622], degree=3))
            ThreePointArc((0.830379945, -2.358064704), (0.956708581, -2.309698831), (1.080236252, -2.254570833))
            add(Edge.make_bspline(
                [(0.88816946, -1.287165167), (0.954882813, -1.383791359), (1.073982269, -1.556408334), (1.068804746, -1.549215881), (1.099886307, -1.613247697), (1.118505632, -1.689593731), (1.137704346, -1.818337157), (1.135749512, -2.003981613), (1.103671613, -2.169907523), (1.080236252, -2.254570833)],
                knots=[0.030903034, 0.030903034, 0.030903034, 0.030903034, 0.091208758, 0.151514483, 0.272125931, 0.39273738, 0.513348828, 0.754571725, 0.995794622, 0.995794622, 0.995794622, 0.995794622], degree=3))
        make_face()
        with Locations(Location((0, 0, 0), (0, 0, 90))):
            Circle(ESBO_O1_R, mode=Mode.SUBTRACT)
    extrude(amount=-RESSALTO_EXTRUS_O1_DEPTH)


solid = part.part
